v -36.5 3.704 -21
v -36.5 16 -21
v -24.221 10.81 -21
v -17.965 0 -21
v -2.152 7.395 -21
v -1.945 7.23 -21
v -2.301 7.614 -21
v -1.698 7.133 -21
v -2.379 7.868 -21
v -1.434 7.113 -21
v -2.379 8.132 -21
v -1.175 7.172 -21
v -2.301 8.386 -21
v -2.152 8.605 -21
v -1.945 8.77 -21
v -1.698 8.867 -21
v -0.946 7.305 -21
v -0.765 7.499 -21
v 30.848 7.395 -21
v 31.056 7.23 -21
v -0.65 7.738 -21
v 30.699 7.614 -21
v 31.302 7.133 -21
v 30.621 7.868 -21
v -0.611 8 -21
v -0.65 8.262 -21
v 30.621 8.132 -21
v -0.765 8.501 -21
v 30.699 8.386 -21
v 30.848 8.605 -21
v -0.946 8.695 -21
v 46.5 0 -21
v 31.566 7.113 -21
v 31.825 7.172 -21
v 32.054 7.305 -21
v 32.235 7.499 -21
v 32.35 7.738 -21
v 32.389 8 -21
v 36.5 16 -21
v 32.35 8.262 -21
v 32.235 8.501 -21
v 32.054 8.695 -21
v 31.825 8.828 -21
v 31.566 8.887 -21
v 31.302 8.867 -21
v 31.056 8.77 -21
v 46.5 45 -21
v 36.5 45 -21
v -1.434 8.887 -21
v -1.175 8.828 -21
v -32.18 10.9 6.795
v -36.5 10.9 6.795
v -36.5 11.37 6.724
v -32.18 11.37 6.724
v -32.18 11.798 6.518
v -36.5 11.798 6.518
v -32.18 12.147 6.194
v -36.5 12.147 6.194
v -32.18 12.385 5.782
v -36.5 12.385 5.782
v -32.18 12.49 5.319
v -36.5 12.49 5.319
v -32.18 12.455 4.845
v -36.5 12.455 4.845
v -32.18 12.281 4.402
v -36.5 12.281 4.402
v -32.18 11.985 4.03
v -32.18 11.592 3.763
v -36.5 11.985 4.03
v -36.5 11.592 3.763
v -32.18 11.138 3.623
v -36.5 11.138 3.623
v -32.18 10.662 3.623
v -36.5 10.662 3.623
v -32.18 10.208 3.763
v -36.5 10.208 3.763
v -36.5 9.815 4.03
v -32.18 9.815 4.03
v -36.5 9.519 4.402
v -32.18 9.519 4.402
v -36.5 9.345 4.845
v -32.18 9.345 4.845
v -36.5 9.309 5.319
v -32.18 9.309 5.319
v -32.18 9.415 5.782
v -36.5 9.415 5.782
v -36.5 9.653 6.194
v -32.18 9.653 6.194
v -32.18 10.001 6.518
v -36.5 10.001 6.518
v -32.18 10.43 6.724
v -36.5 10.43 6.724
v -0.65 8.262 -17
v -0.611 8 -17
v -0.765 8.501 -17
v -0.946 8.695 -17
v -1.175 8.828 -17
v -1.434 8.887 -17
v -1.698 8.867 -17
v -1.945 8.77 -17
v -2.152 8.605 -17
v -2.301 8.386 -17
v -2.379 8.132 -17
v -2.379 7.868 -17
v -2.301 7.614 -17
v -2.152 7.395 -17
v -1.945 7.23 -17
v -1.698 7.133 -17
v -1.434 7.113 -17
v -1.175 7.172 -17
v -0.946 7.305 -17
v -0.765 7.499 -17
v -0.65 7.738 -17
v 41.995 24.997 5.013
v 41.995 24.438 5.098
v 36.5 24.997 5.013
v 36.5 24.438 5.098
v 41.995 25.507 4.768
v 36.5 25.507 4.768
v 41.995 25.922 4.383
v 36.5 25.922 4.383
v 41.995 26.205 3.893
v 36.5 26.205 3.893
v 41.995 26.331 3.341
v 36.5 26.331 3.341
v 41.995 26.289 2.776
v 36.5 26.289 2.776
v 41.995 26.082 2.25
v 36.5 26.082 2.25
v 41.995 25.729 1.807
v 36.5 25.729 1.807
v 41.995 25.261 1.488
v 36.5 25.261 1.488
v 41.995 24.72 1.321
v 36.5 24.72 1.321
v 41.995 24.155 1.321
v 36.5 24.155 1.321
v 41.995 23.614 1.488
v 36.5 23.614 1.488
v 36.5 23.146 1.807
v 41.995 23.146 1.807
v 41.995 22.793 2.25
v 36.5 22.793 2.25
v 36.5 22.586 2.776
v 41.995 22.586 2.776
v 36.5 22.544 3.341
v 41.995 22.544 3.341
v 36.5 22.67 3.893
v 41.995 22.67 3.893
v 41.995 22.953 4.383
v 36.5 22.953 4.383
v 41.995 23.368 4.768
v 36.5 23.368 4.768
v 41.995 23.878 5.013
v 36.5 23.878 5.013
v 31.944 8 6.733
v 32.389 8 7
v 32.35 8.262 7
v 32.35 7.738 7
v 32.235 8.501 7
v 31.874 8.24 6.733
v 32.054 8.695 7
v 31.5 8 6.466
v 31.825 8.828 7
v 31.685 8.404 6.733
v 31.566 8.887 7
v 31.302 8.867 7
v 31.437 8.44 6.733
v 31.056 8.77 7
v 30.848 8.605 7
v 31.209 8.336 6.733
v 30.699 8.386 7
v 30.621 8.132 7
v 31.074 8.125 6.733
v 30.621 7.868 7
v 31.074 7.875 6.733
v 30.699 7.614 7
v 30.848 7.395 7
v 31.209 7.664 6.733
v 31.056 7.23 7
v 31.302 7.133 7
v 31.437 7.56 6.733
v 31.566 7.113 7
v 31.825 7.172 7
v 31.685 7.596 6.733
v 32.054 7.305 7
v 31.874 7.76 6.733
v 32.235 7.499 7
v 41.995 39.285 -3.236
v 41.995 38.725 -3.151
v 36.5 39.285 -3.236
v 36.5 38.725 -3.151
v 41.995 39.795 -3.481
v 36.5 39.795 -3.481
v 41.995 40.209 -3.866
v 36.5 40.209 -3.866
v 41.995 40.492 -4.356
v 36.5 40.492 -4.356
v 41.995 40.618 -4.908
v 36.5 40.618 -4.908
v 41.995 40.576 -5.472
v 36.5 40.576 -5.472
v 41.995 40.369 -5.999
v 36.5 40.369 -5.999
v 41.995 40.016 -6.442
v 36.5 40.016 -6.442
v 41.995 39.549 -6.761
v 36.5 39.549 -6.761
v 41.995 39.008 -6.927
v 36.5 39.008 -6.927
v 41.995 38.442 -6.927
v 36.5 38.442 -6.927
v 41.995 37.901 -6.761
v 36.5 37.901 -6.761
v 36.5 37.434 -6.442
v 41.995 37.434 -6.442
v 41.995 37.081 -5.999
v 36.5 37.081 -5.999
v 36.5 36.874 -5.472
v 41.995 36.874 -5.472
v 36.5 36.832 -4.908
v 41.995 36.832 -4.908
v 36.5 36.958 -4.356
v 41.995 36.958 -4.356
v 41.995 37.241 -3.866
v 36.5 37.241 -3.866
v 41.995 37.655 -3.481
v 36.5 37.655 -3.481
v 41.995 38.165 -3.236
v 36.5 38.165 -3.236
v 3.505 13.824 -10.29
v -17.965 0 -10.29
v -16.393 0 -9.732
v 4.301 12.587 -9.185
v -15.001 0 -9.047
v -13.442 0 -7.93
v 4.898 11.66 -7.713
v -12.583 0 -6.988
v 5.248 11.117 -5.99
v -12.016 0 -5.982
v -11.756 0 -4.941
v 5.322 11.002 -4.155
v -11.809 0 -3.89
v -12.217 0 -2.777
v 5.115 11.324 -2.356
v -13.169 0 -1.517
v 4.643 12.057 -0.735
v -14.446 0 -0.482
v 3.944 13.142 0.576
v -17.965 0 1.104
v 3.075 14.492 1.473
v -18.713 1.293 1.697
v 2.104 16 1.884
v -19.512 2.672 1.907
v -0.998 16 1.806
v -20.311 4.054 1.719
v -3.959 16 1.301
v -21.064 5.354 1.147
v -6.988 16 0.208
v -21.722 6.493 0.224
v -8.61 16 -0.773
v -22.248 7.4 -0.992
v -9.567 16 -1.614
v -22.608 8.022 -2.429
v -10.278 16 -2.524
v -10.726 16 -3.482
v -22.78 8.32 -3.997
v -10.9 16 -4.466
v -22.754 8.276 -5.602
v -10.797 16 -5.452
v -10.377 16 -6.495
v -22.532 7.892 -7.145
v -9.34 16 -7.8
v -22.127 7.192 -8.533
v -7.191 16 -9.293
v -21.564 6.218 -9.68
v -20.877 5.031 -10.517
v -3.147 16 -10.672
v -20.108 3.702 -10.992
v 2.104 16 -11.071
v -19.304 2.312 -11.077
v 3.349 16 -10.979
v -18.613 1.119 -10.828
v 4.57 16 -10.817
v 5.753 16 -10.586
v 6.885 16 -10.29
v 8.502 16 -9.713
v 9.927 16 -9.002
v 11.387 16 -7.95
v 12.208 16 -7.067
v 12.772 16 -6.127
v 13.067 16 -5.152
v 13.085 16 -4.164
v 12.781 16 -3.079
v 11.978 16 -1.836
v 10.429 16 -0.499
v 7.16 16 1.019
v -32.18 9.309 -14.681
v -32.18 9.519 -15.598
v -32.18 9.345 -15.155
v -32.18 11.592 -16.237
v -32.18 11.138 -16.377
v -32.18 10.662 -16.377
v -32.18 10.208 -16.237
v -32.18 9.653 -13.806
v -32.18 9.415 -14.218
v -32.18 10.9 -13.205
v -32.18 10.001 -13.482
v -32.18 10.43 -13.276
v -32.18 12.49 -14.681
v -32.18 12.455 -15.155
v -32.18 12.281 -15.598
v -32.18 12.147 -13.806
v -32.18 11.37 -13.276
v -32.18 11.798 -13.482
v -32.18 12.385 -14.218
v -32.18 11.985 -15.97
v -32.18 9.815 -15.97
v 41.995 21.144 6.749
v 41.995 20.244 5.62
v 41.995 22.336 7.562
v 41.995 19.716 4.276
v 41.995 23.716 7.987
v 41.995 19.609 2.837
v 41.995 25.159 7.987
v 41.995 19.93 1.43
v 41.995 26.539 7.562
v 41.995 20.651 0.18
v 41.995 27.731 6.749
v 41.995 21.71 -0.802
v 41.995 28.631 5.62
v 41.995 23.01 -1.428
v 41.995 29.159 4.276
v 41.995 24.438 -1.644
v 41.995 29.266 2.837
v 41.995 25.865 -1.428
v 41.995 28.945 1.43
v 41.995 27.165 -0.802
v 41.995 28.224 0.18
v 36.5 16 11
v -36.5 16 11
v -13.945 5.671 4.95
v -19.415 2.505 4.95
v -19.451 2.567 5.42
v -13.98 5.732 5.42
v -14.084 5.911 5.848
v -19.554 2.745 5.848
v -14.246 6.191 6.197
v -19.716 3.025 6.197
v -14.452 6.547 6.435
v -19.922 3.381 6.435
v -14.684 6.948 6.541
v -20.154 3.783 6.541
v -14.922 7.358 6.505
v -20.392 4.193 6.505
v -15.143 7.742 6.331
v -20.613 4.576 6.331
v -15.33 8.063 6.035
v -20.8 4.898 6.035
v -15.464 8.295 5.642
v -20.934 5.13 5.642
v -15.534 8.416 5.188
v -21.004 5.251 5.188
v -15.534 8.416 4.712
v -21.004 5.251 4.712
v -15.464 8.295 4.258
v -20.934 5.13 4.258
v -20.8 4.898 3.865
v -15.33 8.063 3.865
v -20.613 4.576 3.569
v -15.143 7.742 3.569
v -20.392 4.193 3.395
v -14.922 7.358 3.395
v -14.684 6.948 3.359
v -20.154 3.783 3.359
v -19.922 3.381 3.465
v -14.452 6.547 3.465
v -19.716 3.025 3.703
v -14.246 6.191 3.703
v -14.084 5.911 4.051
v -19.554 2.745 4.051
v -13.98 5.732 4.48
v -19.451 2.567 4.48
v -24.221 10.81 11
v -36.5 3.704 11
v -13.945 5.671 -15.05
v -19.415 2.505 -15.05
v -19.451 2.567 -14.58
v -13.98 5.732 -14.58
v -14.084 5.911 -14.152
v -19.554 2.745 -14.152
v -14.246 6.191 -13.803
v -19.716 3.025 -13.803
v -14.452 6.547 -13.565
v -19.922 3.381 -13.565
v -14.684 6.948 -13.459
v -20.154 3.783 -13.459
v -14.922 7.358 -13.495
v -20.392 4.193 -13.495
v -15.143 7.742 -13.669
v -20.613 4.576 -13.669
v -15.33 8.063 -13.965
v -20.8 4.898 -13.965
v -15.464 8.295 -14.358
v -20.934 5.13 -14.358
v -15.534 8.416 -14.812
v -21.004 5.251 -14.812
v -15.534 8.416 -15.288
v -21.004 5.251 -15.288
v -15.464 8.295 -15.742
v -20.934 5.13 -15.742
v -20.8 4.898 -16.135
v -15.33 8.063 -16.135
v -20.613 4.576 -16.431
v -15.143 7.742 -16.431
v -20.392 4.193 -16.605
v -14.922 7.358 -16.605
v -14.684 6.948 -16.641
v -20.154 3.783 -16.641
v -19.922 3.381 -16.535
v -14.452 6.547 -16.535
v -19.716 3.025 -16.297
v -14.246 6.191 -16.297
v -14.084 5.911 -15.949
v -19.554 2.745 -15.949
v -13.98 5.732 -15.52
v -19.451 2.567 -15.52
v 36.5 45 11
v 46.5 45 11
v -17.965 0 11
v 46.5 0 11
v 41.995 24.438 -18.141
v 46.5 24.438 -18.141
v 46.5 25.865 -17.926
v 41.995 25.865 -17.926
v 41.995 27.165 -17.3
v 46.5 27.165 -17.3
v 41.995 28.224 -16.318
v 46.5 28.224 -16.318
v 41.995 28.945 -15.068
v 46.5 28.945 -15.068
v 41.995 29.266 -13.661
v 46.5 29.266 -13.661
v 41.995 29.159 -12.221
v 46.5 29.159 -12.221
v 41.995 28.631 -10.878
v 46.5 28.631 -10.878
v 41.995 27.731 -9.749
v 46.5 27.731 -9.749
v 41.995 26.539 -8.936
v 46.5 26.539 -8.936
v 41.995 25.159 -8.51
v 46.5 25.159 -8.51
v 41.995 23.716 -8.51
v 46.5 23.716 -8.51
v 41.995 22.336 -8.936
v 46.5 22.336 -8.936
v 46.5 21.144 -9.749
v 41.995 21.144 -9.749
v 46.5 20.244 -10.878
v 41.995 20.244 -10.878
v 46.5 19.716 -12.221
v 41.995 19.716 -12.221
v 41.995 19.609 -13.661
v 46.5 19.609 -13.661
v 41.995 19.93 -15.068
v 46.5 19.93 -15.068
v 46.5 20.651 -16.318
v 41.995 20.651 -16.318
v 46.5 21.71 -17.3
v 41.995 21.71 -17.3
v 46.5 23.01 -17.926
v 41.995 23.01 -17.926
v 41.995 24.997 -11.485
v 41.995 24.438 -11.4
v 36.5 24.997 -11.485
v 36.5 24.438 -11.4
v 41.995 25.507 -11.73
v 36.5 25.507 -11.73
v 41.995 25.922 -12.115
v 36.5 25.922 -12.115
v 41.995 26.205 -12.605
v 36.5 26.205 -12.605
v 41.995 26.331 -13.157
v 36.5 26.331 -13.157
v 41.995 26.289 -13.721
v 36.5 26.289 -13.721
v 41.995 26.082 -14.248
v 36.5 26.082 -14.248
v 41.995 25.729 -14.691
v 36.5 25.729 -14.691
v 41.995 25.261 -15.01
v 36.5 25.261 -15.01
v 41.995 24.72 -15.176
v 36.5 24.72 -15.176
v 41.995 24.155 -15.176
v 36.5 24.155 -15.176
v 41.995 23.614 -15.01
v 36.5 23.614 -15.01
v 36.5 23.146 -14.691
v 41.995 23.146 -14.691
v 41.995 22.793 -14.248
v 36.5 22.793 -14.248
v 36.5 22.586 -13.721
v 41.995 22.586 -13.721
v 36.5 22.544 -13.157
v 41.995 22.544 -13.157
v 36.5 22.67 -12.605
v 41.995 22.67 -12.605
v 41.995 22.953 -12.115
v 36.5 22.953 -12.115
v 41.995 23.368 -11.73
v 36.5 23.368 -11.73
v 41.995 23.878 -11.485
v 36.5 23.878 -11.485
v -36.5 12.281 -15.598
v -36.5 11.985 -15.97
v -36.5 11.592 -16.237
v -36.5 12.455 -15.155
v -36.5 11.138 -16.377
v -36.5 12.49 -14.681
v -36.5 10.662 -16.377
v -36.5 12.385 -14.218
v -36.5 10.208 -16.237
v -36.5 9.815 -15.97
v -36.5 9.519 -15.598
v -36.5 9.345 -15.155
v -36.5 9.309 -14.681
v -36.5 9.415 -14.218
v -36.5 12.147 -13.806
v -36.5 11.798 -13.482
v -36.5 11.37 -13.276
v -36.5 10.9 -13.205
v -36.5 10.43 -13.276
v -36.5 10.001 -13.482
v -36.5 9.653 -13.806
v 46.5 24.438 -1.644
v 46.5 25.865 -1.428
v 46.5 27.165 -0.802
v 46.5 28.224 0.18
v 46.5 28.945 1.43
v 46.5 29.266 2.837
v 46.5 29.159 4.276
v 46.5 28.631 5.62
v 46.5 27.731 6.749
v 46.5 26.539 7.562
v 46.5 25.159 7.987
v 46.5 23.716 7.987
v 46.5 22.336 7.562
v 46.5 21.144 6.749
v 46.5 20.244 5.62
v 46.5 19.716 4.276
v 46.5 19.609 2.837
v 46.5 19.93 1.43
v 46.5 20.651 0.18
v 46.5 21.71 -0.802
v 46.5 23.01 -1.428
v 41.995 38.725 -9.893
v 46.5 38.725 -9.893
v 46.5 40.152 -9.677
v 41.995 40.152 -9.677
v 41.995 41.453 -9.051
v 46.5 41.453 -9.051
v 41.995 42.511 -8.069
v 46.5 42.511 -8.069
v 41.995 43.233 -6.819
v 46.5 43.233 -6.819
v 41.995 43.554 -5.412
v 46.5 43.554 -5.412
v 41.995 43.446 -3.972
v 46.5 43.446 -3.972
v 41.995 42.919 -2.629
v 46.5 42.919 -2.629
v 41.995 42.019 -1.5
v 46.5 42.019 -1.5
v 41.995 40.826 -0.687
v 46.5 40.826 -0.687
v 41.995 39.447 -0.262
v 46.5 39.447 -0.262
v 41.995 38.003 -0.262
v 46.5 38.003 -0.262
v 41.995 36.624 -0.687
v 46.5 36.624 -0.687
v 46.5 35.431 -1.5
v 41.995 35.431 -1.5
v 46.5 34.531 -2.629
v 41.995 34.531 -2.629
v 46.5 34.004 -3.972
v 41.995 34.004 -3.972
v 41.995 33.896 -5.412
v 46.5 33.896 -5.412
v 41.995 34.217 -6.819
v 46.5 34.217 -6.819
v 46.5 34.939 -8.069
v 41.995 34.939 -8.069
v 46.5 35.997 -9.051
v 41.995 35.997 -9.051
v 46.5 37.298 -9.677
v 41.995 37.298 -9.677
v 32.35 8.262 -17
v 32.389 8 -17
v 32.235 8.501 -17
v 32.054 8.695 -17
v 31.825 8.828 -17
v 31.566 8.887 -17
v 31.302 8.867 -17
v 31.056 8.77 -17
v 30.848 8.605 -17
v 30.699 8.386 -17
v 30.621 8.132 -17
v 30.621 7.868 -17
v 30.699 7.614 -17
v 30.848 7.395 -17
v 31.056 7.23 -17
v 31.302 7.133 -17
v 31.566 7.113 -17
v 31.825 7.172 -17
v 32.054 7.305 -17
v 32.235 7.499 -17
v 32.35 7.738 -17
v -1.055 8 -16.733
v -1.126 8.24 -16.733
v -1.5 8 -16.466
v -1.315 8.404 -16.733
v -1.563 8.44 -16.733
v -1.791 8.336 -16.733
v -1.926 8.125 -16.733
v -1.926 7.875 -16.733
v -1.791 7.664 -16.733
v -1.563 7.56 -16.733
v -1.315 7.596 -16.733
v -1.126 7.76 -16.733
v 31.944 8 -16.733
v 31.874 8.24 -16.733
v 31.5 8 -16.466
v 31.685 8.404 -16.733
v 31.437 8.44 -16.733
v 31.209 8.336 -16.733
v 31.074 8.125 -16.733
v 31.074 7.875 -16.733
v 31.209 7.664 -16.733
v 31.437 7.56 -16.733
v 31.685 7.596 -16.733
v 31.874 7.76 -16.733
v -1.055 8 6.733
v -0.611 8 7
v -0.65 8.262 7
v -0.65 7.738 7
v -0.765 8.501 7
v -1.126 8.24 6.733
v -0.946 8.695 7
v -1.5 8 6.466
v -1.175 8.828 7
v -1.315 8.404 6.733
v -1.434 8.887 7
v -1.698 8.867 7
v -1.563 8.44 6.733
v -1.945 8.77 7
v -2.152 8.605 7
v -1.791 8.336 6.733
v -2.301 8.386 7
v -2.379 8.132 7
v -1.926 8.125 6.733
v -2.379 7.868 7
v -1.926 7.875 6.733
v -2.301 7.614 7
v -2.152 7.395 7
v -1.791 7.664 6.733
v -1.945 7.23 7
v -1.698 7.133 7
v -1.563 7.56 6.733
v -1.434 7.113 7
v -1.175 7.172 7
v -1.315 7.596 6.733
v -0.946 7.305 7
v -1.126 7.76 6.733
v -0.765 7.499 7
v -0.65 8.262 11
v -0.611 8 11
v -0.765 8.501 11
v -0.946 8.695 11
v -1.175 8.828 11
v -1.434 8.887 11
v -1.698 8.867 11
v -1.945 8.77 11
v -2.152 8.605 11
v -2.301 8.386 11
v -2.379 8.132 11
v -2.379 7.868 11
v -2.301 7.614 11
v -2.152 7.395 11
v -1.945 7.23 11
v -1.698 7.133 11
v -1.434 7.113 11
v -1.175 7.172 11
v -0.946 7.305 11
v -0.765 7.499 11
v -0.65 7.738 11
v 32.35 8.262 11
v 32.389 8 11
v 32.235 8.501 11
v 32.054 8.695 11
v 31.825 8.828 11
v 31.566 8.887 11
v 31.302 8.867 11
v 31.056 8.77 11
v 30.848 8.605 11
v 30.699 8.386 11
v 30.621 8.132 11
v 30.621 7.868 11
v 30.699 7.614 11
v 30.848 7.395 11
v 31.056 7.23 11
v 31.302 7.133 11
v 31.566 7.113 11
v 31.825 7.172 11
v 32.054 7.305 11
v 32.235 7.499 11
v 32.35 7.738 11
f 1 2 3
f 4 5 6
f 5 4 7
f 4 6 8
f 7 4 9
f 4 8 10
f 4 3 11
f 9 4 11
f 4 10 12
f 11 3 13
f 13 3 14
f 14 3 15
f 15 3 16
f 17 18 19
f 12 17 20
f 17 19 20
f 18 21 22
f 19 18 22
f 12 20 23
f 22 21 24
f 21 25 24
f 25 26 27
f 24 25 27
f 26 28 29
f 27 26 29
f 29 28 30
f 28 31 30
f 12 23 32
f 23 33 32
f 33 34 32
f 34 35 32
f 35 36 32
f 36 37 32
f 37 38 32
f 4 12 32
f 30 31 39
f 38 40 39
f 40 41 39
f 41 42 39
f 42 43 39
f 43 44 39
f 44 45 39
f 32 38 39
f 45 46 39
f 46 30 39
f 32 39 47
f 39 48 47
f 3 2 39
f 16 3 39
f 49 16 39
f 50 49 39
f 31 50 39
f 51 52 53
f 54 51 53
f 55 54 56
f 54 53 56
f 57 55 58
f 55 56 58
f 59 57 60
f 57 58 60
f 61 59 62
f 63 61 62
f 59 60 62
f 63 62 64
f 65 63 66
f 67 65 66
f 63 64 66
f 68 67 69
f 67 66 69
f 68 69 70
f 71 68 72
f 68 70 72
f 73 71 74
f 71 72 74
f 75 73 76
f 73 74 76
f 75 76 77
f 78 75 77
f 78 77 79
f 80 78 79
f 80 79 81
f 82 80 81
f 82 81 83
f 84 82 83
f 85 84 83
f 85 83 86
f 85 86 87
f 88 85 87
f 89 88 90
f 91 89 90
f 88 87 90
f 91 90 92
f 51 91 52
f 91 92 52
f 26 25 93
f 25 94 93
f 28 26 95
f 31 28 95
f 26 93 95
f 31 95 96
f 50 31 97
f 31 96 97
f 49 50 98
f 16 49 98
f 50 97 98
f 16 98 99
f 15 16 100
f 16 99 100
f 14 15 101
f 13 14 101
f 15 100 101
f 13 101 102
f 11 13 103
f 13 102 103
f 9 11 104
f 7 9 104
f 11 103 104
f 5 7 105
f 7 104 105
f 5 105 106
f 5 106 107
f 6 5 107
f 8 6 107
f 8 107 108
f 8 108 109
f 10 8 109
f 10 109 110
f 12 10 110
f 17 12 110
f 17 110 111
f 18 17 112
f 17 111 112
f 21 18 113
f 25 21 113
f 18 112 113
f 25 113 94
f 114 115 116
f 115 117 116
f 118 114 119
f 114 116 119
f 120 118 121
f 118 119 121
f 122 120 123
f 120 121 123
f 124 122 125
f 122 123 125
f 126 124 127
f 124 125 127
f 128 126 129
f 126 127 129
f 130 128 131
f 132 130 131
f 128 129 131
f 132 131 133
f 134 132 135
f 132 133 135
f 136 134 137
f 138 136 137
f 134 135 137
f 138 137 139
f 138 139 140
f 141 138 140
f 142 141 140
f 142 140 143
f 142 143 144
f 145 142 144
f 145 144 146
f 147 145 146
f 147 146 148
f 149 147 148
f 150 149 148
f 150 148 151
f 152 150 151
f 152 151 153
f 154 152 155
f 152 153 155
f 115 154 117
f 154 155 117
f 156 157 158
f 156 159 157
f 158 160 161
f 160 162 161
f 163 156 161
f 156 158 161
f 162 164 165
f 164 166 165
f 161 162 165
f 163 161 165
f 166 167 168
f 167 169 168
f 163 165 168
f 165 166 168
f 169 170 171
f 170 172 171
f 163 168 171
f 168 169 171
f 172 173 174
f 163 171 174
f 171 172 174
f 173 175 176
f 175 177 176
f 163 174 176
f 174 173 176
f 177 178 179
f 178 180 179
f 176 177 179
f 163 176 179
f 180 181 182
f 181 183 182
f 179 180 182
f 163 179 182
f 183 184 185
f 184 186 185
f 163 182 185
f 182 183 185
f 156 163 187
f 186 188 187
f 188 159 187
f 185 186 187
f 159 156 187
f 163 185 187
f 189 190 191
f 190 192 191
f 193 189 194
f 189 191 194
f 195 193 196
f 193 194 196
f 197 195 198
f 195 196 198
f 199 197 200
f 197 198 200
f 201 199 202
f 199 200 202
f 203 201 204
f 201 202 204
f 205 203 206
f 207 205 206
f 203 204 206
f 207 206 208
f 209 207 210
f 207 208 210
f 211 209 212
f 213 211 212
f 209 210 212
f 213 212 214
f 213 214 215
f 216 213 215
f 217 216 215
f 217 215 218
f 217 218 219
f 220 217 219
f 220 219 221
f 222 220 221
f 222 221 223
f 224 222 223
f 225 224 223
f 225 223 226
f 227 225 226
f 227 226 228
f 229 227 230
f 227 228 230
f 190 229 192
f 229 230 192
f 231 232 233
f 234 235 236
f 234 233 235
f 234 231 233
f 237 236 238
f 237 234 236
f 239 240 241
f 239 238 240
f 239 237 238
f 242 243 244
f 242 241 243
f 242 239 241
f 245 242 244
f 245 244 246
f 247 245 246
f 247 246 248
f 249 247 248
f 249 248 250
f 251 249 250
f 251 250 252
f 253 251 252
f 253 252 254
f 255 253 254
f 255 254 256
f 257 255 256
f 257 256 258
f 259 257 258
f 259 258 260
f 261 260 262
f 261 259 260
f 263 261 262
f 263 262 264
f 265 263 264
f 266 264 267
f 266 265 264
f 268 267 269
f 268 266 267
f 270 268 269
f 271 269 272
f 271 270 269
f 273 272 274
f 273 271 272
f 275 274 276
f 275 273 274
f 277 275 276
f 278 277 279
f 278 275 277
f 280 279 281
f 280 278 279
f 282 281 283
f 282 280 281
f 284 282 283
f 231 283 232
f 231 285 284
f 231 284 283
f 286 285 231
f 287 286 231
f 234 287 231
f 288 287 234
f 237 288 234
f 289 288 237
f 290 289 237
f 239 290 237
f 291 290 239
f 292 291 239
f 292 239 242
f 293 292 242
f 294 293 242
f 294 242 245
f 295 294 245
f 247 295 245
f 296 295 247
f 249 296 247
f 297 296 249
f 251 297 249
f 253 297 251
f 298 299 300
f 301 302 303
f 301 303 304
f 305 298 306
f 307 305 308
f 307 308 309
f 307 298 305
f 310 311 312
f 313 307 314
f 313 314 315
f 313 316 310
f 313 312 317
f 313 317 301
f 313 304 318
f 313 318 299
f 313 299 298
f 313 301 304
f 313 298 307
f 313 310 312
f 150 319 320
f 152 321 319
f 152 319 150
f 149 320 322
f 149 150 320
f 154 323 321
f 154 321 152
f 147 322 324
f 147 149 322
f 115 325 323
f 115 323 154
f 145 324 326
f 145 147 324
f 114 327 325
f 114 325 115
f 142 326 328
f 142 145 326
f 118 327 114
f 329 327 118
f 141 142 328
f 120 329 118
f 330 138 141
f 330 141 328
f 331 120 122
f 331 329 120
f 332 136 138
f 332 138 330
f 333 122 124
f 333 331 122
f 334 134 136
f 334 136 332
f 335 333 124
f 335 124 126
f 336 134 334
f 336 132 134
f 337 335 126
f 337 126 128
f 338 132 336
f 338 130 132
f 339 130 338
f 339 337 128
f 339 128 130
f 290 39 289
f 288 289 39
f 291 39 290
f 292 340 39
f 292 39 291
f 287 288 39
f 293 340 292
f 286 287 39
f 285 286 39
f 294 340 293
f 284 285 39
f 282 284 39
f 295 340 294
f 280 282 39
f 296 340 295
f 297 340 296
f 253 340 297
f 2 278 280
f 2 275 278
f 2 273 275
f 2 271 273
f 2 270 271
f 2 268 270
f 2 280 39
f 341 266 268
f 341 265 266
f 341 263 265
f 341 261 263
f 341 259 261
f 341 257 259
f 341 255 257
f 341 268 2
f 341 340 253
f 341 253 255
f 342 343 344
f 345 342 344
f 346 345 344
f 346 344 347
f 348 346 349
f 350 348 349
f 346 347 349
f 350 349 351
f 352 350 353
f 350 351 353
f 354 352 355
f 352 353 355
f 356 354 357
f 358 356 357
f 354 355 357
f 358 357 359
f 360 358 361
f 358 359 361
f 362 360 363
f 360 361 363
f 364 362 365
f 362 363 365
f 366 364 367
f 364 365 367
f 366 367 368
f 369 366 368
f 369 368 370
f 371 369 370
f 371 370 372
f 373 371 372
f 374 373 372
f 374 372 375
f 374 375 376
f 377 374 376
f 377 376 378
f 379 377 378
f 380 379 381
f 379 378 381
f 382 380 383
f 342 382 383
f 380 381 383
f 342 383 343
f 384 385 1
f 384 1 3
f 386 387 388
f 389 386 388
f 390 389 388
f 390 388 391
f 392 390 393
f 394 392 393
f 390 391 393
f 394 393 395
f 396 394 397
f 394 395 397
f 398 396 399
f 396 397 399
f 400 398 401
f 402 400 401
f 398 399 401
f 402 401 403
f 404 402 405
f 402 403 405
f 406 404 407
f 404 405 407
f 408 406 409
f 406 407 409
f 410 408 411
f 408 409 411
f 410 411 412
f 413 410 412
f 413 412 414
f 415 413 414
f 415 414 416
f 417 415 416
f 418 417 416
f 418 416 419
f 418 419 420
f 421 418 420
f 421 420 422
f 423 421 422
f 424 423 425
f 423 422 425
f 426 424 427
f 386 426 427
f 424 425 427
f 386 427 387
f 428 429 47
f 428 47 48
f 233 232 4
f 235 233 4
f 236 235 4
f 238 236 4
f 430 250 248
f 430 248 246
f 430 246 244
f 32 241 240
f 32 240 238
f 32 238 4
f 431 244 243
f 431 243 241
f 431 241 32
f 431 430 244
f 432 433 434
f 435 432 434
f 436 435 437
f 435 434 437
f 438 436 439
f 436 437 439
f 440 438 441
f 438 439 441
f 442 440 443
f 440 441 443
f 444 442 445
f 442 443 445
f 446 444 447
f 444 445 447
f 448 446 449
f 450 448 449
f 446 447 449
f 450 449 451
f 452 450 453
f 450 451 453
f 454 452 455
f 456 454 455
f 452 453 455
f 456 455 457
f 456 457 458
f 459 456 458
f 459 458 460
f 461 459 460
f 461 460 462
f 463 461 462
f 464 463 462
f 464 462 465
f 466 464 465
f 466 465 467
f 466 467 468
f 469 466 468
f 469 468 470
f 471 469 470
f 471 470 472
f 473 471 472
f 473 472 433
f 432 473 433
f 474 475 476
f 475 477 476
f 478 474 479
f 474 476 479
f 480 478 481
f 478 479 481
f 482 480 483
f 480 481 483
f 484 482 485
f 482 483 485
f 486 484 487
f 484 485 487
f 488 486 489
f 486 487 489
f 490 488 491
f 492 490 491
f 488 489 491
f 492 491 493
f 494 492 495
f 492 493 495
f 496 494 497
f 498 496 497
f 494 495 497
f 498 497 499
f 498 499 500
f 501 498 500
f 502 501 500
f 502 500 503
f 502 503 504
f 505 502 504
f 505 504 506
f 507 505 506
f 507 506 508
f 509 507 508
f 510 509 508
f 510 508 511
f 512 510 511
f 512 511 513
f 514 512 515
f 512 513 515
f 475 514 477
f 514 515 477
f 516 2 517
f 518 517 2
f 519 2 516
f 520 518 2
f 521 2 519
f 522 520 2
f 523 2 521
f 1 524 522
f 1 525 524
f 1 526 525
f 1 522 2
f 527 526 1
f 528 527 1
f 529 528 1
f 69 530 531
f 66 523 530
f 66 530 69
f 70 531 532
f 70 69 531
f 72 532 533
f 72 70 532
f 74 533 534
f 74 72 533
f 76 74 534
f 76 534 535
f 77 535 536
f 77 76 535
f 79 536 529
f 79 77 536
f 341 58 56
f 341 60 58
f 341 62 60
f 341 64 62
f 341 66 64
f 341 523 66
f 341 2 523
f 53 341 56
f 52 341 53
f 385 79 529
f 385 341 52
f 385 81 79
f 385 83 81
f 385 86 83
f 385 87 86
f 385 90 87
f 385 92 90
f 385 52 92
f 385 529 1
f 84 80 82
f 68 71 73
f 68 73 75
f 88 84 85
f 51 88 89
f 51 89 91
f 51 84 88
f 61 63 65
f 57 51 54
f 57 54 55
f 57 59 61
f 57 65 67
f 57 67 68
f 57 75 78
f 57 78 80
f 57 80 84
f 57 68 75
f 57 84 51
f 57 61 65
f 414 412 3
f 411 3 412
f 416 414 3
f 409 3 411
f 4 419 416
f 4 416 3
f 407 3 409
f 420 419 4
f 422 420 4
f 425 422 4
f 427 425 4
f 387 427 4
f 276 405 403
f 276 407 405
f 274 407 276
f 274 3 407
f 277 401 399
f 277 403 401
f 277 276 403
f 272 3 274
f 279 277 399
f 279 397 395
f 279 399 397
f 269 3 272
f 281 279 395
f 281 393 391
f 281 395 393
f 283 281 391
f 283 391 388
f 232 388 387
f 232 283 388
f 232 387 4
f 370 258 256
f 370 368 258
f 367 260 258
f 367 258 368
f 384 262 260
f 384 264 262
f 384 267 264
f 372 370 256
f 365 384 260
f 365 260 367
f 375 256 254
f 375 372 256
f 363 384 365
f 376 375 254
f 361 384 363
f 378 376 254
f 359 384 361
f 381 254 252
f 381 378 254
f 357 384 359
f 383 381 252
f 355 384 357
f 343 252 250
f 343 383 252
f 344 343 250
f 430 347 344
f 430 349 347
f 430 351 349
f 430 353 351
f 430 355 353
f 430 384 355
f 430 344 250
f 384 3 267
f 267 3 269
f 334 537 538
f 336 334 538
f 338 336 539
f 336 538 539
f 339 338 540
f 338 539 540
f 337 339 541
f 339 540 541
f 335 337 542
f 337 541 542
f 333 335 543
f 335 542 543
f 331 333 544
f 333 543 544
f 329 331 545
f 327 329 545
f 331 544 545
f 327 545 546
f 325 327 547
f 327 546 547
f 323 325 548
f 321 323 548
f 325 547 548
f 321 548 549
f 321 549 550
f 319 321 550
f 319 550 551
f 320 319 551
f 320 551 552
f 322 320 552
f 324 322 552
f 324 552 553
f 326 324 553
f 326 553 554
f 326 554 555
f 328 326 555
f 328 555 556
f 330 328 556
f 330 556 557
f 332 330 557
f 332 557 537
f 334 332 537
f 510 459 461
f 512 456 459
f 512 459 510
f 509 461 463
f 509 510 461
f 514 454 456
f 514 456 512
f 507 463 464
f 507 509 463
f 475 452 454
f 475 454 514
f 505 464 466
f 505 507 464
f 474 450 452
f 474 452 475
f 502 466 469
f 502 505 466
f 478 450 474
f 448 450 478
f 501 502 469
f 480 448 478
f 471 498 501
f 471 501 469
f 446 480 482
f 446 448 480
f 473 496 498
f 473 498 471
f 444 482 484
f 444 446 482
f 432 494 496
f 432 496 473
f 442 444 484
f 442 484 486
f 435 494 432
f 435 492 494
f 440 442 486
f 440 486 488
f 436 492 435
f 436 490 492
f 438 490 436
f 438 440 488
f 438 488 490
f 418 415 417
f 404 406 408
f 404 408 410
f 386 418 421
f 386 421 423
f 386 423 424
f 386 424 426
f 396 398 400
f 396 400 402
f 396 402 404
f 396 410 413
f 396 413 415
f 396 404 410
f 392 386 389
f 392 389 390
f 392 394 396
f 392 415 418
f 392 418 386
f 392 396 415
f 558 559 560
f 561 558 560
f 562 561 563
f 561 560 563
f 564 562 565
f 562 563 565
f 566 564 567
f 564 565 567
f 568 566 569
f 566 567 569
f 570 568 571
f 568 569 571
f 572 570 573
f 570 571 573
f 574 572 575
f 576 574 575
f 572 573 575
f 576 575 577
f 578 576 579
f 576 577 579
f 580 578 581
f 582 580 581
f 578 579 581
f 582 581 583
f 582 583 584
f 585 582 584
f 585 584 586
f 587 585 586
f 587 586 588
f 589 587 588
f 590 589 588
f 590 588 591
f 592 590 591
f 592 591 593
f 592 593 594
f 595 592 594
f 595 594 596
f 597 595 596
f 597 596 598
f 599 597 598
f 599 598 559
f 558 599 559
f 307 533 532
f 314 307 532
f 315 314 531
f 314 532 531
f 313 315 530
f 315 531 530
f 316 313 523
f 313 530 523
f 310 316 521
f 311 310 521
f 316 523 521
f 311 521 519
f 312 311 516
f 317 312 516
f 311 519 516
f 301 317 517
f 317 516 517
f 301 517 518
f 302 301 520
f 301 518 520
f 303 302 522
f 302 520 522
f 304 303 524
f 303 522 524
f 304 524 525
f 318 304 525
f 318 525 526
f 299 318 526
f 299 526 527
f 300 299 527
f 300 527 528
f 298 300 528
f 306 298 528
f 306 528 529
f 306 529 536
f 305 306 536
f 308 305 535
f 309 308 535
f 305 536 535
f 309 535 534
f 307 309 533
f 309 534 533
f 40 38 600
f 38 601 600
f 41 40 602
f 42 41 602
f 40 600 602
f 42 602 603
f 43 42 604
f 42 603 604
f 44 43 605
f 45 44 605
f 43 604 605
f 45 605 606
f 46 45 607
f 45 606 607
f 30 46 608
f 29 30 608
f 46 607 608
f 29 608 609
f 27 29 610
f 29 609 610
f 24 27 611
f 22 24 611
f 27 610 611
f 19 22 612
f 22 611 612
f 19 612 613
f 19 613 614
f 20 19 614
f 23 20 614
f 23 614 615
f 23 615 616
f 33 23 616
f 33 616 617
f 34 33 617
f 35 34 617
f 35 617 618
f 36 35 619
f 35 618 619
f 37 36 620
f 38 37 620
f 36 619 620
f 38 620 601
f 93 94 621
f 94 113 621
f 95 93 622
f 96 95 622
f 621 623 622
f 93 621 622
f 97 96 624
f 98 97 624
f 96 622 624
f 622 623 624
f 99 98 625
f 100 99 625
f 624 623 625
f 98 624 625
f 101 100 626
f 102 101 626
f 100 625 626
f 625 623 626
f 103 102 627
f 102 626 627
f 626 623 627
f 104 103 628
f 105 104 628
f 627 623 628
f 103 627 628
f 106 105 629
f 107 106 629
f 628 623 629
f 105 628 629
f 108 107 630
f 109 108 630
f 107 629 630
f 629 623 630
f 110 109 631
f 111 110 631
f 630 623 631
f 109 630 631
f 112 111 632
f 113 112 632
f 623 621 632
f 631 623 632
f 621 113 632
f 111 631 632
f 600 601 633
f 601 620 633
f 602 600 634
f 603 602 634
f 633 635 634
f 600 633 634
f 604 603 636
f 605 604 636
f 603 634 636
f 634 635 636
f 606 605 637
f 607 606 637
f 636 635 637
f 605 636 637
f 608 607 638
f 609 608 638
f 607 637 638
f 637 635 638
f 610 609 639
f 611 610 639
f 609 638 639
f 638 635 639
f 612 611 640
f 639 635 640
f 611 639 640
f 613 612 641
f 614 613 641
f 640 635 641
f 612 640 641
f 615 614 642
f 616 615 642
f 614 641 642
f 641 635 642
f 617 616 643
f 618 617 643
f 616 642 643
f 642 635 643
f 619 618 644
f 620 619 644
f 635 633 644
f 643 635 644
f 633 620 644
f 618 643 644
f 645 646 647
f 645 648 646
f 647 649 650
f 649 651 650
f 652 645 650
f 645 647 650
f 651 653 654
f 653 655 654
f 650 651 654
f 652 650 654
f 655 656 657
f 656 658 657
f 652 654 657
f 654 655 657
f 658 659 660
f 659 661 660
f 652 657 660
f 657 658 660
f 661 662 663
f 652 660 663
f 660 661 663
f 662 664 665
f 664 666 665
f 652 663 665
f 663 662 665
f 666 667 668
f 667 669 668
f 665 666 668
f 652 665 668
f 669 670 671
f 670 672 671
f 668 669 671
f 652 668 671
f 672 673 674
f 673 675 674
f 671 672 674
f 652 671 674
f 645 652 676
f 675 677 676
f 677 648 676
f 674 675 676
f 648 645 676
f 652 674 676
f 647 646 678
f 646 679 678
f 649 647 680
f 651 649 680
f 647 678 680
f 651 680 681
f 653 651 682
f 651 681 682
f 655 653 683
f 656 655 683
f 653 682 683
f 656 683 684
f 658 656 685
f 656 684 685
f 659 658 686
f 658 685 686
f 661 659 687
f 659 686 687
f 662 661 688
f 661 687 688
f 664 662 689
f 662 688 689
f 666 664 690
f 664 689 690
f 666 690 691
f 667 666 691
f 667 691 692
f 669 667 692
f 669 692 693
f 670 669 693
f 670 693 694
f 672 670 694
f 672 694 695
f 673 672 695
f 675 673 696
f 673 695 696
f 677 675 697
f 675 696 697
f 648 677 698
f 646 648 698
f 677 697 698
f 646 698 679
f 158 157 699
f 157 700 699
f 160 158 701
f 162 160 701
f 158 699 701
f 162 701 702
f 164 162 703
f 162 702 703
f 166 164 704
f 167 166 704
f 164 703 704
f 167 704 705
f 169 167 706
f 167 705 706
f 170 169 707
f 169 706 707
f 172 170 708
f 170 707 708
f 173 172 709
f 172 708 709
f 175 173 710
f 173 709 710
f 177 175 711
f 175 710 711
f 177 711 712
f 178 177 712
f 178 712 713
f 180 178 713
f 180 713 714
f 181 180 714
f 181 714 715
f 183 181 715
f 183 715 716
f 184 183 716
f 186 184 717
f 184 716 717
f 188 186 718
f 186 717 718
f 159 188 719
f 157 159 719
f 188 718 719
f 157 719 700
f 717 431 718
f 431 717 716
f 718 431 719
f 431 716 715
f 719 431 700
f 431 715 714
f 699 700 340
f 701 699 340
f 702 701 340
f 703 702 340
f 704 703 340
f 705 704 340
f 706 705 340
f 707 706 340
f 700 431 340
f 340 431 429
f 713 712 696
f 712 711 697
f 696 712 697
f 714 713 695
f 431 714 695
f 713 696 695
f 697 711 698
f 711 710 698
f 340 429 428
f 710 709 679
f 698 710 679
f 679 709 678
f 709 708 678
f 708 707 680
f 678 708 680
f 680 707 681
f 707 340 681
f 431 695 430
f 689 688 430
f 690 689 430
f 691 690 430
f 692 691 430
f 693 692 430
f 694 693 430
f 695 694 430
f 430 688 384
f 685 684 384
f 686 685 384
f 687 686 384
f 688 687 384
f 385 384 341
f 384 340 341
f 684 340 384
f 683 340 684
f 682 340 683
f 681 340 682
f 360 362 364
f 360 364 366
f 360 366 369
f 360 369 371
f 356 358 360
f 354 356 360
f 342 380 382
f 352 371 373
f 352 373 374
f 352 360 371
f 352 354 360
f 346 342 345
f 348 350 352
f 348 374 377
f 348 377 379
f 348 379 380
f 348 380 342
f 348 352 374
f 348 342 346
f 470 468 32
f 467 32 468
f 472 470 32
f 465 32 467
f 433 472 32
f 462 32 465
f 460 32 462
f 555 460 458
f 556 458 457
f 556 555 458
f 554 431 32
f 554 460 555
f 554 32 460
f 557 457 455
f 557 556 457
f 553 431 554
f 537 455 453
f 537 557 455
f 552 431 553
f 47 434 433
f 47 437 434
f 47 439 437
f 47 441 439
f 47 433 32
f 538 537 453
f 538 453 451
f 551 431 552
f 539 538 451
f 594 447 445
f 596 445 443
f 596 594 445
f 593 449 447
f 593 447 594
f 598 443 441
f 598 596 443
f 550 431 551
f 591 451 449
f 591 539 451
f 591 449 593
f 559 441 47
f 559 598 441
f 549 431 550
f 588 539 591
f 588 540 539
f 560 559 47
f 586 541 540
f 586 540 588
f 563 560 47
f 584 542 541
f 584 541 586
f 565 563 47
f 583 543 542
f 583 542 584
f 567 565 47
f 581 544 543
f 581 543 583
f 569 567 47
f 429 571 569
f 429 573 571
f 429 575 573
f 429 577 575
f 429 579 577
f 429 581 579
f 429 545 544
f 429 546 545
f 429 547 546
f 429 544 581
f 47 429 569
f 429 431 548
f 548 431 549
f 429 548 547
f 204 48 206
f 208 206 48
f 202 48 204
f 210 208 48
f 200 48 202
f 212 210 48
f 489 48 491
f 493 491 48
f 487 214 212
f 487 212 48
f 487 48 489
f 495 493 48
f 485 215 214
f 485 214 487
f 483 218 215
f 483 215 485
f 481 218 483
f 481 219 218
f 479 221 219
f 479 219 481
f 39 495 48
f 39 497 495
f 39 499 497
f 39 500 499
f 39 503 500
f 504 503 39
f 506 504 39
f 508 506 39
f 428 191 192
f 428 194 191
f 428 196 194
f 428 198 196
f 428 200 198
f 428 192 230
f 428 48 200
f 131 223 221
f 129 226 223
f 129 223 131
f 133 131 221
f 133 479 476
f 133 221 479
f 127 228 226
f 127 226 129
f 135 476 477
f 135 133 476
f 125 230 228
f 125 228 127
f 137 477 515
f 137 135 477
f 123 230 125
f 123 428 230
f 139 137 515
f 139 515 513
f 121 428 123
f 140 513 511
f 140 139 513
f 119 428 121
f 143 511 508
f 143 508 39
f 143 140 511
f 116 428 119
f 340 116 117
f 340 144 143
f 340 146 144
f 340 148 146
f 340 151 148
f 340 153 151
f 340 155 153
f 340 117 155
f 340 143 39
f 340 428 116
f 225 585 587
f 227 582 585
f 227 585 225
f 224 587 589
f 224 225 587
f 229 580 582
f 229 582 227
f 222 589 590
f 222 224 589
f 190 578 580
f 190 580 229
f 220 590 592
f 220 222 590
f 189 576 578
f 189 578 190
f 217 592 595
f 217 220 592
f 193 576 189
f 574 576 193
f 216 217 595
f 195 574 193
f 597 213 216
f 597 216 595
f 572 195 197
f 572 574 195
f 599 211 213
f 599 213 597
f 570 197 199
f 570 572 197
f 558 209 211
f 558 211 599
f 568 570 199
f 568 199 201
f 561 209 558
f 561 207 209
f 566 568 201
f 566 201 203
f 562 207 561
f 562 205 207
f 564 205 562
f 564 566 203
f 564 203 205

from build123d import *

# Parameters (mm, degrees)
SKETCH1_W                                      = 73
SKETCH1_H                                      = 40
BOSS_EXTRUDE1_DEPTH                            = 16
CUT_EXTRUDE1_DEPTH                             = 31
CUT_EXTRUDE2_REACH                             = 59.847
SKETCH14_R                                     = 6.5
CUT_EXTRUDE2_DIRECTION_2_REACH                 = 59.847
SKETCH15_R                                     = 1.595
CUT_EXTRUDE3_DEPTH                             = 4.32
SKETCH16_R                                     = 1.595
CUT_EXTRUDE4_DEPTH                             = 6.32
SKETCH18_R                                     = 1.595
CUT_EXTRUDE6_DEPTH                             = 6.32
SKETCH26_W                                     = 10
SKETCH26_H                                     = 40
BOSS_EXTRUDE2_DEPTH                            = 45
SKETCH27_R                                     = 1.595
CUT_EXTRUDE7_DEPTH                             = 97.509066932
SKETCH28_R                                     = 1.595
CUT_EXTRUDE10_DEPTH                            = 6.32
BOSS_EXTRUDE3_DEPTH                            = 1
SKETCH37_R                                     = 1.595
CUT_EXTRUDE14_DEPTH                            = 6.78
CUT_EXTRUDE15_START                            = -6.78
SKETCH38_R                                     = 1.595
CUT_EXTRUDE15_DEPTH                            = 6.78
SKETCH52_W                                     = 101.196897311
SKETCH52_H                                     = 58.467472524
CUT_EXTRUDE21_DEPTH                            = 9
CBORE_FOR_6_SOCKET_HEAD_CAP_SCREW1_D           = 3.7973
CBORE_FOR_6_SOCKET_HEAD_CAP_SCREW1_DEPTH       = 46.5
CBORE_FOR_6_SOCKET_HEAD_CAP_SCREW1_CBORE_D     = 9.68502
CBORE_FOR_6_SOCKET_HEAD_CAP_SCREW1_CBORE_DEPTH = 4.505198
CBORE_FOR_6_SOCKET_HEAD_CAP_SCREW1_TIP         = 1.140824014


# Read off the part's stored shape, not the designer's step: AdvancedHole3, AdvancedHole4
with BuildPart() as part:
    # Sketch1 → Boss-Extrude1 (new body)
    with BuildSketch(Plane(origin=(0, 0, 0), x_dir=(1, 0, 0), z_dir=(0, 1, 0))):
        Rectangle(SKETCH1_W, SKETCH1_H)
    extrude(amount=BOSS_EXTRUDE1_DEPTH)

    # Sketch5 → Cut-Extrude1 (cut)
    with BuildSketch(Plane(origin=(0, 0, -20), x_dir=(-1, 0, 0), z_dir=(0, 0, -1))):
        Polygon((17.965335593, 0), (24.220929062, 10.809975543), (36.5, 3.704235511), (36.5, 0), align=None)
    extrude(amount=-CUT_EXTRUDE1_DEPTH, mode=Mode.SUBTRACT)

    # Sketch14 → Cut-Extrude2 (cut, up to next)
    with BuildSketch(Plane(origin=(2.103927099, 16, -20), x_dir=(0, 0, 1), z_dir=(-0.8407935043817242, -0.5413559669842936, 0)), mode=Mode.PRIVATE) as cut_extrude2_sk1:
        with Locations(Location((15.40672826, 0.54117756, 0), (0, 0, 208.778472392))):
            Circle(SKETCH14_R)
    cut_extrude2_tool1 = extrude(cut_extrude2_sk1.sketch, amount=-CUT_EXTRUDE2_REACH, mode=Mode.PRIVATE) & part.part
    add(cut_extrude2_tool1.solids().sort_by_distance((1.810957, 16.455019, -4.593272))[0], mode=Mode.SUBTRACT)

    # Sketch14 → Cut-Extrude2 direction 2 (cut, up to next)
    with BuildSketch(Plane(origin=(2.103927099, 16, -20), x_dir=(0, 0, 1), z_dir=(-0.8407935043817242, -0.5413559669842936, 0)), mode=Mode.PRIVATE) as cut_extrude2_direction_2_sk1:
        with Locations(Location((15.40672826, 0.54117756, 0), (0, 0, 208.778472392))):
            Circle(SKETCH14_R)
    cut_extrude2_direction_2_tool1 = extrude(cut_extrude2_direction_2_sk1.sketch, amount=CUT_EXTRUDE2_DIRECTION_2_REACH, mode=Mode.PRIVATE) & part.part
    add(cut_extrude2_direction_2_tool1.solids().sort_by_distance((1.810957, 16.455019, -4.593272))[0], mode=Mode.SUBTRACT)

    # Sketch15 → Cut-Extrude3 (cut)
    with BuildSketch(Plane.ZY.offset(36.5)):
        with Locations((-14.800300311, 10.899842323)):
            Circle(SKETCH15_R)
        with Locations((5.199699689, 10.899842323)):
            Circle(SKETCH15_R)
    extrude(amount=-CUT_EXTRUDE3_DEPTH, mode=Mode.SUBTRACT)

    # Sketch16 → Cut-Extrude4 (cut)
    with BuildSketch(Plane(origin=(-13.45840239, -7.788203938, 0), x_dir=(0, 0, 1), z_dir=(-0.8655239452556988, -0.5008675475502585, 0))):
        with Locations(Location((-15.050029961, 13.487770019, 0), (0, 0, 270))):
            Circle(SKETCH16_R)
        with Locations(Location((4.949970039, 13.487770019, 0), (0, 0, 270))):
            Circle(SKETCH16_R)
    extrude(amount=-CUT_EXTRUDE4_DEPTH, mode=Mode.SUBTRACT)

    # Sketch18 → Cut-Extrude6 (cut)
    with BuildSketch(Plane.XY.offset(20)):
        with Locations((19, 8)):
            Circle(SKETCH18_R)
        with Locations((-19, 8)):
            Circle(SKETCH18_R)
    extrude(amount=-CUT_EXTRUDE6_DEPTH, mode=Mode.SUBTRACT)

    # Sketch26 → Boss-Extrude2 (add)
    with BuildSketch(Plane.XZ):
        with Locations((41.5, 0)):
            Rectangle(SKETCH26_W, SKETCH26_H)
    extrude(amount=-BOSS_EXTRUDE2_DEPTH)

    # Sketch27 → Cut-Extrude7 (cut, through all)
    with BuildSketch(Plane(origin=(46.5, 0, 0), x_dir=(0, 0, -1), z_dir=(1, 0, 0))):
        with Locations((5.05, 38.725)):
            Circle(SKETCH27_R)
        with Locations((13.298891971, 24.4375)):
            Circle(SKETCH27_R)
        with Locations((-3.198891971, 24.4375)):
            Circle(SKETCH27_R)
    extrude(amount=-CUT_EXTRUDE7_DEPTH, mode=Mode.SUBTRACT)

    # Sketch28 → Cut-Extrude10 (cut)
    with BuildSketch(Plane.XY.offset(20)):
        with Locations((41.5, 22.5)):
            Circle(SKETCH28_R)
    extrude(amount=-CUT_EXTRUDE10_DEPTH, mode=Mode.SUBTRACT)

    # Sketch33 → Boss-Extrude3 (add)
    with BuildSketch(Plane(origin=(0, 0, -20), x_dir=(-1, 0, 0), z_dir=(0, 0, -1))):
        Polygon((-46.5, 45), (-36.5, 45), (-36.5, 16), (36.5, 16), (36.5, 3.704235511), (24.220929062, 10.809975543), (17.965335593, 0), (-46.5, 0), align=None)
    extrude(amount=BOSS_EXTRUDE3_DEPTH)

    # Sketch37 → Cut-Extrude14 (cut)
    with BuildSketch(Plane.ZY.offset(36.5)):
        with Locations((15.5, 7.999173791)):
            Circle(SKETCH37_R)
    extrude(amount=-CUT_EXTRUDE14_DEPTH, mode=Mode.SUBTRACT)

    # Sketch38 → Cut-Extrude15 (cut)
    with BuildSketch(Plane(origin=(46.5, 0, 0), x_dir=(0, 0, -1), z_dir=(1, 0, 0)).offset(CUT_EXTRUDE15_START)):
        with Locations(Location((-15.5, 7.999173791, 0), (0, 0, 180))):
            Circle(SKETCH38_R)
    extrude(amount=CUT_EXTRUDE15_DEPTH, mode=Mode.SUBTRACT)

    # Sketch52 → Cut-Extrude21 (cut)
    with BuildSketch(Plane(origin=(0, 0, 11), x_dir=(-1, 0, 0), z_dir=(0, 0, -1))):
        with Locations((-4.130814665, 20.01964795)):
            Rectangle(SKETCH52_W, SKETCH52_H)
    extrude(amount=-CUT_EXTRUDE21_DEPTH, mode=Mode.SUBTRACT)

    # CBORE for #6 Socket Head Cap Screw1
    with Locations(Plane(origin=(46.5, 0, 0), x_dir=(0, 0, -1), z_dir=(1, 0, 0))):
        with Locations((5.05, 38.725), (13.298891971, 24.4375), (-3.198891971, 24.4375)):
            CounterBoreHole(CBORE_FOR_6_SOCKET_HEAD_CAP_SCREW1_D / 2, CBORE_FOR_6_SOCKET_HEAD_CAP_SCREW1_CBORE_D / 2, CBORE_FOR_6_SOCKET_HEAD_CAP_SCREW1_CBORE_DEPTH, depth=CBORE_FOR_6_SOCKET_HEAD_CAP_SCREW1_DEPTH)
            with Locations((0, 0, -(CBORE_FOR_6_SOCKET_HEAD_CAP_SCREW1_DEPTH + CBORE_FOR_6_SOCKET_HEAD_CAP_SCREW1_TIP / 2))):  # 118° drill point
                Cone(0, CBORE_FOR_6_SOCKET_HEAD_CAP_SCREW1_D / 2, CBORE_FOR_6_SOCKET_HEAD_CAP_SCREW1_TIP, mode=Mode.SUBTRACT)

    # AdvancedHole3 outline → AdvancedHole3 (revolve, cut)
    with BuildSketch(Plane(origin=(-1.5, 8, 0), x_dir=(1, 0, 0), z_dir=(0, -1, 0))):
        Polygon((0.889, -21), (0.889, -17.000000126), (0, -16.465835036), (0, -21), align=None)
    revolve(axis=Axis((-1.5, 8, 0), (0, 0, 1)), mode=Mode.SUBTRACT)

    # AdvancedHole3 2 outline → AdvancedHole3 2 (revolve, cut)
    with BuildSketch(Plane(origin=(31.5, 8, 0), x_dir=(1, 0, 0), z_dir=(0, -1, 0))):
        Polygon((0.889, -21), (0.889, -17.000000126), (0, -16.465835036), (0, -21), align=None)
    revolve(axis=Axis((31.5, 8, 0), (0, 0, 1)), mode=Mode.SUBTRACT)

    # AdvancedHole4 outline → AdvancedHole4 (revolve, cut)
    with BuildSketch(Plane(origin=(-1.5, 8, 0), x_dir=(1, 0, 0), z_dir=(0, -1, 0))):
        Polygon((0, 6.465835036), (0.889, 7.000000126), (0.889, 11), (0, 11), align=None)
    revolve(axis=Axis((-1.5, 8, 0), (0, 0, 1)), mode=Mode.SUBTRACT)

    # AdvancedHole4 2 outline → AdvancedHole4 2 (revolve, cut)
    with BuildSketch(Plane(origin=(31.5, 8, 0), x_dir=(1, 0, 0), z_dir=(0, -1, 0))):
        Polygon((0, 6.465835036), (0.889, 7.000000126), (0.889, 11), (0, 11), align=None)
    revolve(axis=Axis((31.5, 8, 0), (0, 0, 1)), mode=Mode.SUBTRACT)


solid = part.part
